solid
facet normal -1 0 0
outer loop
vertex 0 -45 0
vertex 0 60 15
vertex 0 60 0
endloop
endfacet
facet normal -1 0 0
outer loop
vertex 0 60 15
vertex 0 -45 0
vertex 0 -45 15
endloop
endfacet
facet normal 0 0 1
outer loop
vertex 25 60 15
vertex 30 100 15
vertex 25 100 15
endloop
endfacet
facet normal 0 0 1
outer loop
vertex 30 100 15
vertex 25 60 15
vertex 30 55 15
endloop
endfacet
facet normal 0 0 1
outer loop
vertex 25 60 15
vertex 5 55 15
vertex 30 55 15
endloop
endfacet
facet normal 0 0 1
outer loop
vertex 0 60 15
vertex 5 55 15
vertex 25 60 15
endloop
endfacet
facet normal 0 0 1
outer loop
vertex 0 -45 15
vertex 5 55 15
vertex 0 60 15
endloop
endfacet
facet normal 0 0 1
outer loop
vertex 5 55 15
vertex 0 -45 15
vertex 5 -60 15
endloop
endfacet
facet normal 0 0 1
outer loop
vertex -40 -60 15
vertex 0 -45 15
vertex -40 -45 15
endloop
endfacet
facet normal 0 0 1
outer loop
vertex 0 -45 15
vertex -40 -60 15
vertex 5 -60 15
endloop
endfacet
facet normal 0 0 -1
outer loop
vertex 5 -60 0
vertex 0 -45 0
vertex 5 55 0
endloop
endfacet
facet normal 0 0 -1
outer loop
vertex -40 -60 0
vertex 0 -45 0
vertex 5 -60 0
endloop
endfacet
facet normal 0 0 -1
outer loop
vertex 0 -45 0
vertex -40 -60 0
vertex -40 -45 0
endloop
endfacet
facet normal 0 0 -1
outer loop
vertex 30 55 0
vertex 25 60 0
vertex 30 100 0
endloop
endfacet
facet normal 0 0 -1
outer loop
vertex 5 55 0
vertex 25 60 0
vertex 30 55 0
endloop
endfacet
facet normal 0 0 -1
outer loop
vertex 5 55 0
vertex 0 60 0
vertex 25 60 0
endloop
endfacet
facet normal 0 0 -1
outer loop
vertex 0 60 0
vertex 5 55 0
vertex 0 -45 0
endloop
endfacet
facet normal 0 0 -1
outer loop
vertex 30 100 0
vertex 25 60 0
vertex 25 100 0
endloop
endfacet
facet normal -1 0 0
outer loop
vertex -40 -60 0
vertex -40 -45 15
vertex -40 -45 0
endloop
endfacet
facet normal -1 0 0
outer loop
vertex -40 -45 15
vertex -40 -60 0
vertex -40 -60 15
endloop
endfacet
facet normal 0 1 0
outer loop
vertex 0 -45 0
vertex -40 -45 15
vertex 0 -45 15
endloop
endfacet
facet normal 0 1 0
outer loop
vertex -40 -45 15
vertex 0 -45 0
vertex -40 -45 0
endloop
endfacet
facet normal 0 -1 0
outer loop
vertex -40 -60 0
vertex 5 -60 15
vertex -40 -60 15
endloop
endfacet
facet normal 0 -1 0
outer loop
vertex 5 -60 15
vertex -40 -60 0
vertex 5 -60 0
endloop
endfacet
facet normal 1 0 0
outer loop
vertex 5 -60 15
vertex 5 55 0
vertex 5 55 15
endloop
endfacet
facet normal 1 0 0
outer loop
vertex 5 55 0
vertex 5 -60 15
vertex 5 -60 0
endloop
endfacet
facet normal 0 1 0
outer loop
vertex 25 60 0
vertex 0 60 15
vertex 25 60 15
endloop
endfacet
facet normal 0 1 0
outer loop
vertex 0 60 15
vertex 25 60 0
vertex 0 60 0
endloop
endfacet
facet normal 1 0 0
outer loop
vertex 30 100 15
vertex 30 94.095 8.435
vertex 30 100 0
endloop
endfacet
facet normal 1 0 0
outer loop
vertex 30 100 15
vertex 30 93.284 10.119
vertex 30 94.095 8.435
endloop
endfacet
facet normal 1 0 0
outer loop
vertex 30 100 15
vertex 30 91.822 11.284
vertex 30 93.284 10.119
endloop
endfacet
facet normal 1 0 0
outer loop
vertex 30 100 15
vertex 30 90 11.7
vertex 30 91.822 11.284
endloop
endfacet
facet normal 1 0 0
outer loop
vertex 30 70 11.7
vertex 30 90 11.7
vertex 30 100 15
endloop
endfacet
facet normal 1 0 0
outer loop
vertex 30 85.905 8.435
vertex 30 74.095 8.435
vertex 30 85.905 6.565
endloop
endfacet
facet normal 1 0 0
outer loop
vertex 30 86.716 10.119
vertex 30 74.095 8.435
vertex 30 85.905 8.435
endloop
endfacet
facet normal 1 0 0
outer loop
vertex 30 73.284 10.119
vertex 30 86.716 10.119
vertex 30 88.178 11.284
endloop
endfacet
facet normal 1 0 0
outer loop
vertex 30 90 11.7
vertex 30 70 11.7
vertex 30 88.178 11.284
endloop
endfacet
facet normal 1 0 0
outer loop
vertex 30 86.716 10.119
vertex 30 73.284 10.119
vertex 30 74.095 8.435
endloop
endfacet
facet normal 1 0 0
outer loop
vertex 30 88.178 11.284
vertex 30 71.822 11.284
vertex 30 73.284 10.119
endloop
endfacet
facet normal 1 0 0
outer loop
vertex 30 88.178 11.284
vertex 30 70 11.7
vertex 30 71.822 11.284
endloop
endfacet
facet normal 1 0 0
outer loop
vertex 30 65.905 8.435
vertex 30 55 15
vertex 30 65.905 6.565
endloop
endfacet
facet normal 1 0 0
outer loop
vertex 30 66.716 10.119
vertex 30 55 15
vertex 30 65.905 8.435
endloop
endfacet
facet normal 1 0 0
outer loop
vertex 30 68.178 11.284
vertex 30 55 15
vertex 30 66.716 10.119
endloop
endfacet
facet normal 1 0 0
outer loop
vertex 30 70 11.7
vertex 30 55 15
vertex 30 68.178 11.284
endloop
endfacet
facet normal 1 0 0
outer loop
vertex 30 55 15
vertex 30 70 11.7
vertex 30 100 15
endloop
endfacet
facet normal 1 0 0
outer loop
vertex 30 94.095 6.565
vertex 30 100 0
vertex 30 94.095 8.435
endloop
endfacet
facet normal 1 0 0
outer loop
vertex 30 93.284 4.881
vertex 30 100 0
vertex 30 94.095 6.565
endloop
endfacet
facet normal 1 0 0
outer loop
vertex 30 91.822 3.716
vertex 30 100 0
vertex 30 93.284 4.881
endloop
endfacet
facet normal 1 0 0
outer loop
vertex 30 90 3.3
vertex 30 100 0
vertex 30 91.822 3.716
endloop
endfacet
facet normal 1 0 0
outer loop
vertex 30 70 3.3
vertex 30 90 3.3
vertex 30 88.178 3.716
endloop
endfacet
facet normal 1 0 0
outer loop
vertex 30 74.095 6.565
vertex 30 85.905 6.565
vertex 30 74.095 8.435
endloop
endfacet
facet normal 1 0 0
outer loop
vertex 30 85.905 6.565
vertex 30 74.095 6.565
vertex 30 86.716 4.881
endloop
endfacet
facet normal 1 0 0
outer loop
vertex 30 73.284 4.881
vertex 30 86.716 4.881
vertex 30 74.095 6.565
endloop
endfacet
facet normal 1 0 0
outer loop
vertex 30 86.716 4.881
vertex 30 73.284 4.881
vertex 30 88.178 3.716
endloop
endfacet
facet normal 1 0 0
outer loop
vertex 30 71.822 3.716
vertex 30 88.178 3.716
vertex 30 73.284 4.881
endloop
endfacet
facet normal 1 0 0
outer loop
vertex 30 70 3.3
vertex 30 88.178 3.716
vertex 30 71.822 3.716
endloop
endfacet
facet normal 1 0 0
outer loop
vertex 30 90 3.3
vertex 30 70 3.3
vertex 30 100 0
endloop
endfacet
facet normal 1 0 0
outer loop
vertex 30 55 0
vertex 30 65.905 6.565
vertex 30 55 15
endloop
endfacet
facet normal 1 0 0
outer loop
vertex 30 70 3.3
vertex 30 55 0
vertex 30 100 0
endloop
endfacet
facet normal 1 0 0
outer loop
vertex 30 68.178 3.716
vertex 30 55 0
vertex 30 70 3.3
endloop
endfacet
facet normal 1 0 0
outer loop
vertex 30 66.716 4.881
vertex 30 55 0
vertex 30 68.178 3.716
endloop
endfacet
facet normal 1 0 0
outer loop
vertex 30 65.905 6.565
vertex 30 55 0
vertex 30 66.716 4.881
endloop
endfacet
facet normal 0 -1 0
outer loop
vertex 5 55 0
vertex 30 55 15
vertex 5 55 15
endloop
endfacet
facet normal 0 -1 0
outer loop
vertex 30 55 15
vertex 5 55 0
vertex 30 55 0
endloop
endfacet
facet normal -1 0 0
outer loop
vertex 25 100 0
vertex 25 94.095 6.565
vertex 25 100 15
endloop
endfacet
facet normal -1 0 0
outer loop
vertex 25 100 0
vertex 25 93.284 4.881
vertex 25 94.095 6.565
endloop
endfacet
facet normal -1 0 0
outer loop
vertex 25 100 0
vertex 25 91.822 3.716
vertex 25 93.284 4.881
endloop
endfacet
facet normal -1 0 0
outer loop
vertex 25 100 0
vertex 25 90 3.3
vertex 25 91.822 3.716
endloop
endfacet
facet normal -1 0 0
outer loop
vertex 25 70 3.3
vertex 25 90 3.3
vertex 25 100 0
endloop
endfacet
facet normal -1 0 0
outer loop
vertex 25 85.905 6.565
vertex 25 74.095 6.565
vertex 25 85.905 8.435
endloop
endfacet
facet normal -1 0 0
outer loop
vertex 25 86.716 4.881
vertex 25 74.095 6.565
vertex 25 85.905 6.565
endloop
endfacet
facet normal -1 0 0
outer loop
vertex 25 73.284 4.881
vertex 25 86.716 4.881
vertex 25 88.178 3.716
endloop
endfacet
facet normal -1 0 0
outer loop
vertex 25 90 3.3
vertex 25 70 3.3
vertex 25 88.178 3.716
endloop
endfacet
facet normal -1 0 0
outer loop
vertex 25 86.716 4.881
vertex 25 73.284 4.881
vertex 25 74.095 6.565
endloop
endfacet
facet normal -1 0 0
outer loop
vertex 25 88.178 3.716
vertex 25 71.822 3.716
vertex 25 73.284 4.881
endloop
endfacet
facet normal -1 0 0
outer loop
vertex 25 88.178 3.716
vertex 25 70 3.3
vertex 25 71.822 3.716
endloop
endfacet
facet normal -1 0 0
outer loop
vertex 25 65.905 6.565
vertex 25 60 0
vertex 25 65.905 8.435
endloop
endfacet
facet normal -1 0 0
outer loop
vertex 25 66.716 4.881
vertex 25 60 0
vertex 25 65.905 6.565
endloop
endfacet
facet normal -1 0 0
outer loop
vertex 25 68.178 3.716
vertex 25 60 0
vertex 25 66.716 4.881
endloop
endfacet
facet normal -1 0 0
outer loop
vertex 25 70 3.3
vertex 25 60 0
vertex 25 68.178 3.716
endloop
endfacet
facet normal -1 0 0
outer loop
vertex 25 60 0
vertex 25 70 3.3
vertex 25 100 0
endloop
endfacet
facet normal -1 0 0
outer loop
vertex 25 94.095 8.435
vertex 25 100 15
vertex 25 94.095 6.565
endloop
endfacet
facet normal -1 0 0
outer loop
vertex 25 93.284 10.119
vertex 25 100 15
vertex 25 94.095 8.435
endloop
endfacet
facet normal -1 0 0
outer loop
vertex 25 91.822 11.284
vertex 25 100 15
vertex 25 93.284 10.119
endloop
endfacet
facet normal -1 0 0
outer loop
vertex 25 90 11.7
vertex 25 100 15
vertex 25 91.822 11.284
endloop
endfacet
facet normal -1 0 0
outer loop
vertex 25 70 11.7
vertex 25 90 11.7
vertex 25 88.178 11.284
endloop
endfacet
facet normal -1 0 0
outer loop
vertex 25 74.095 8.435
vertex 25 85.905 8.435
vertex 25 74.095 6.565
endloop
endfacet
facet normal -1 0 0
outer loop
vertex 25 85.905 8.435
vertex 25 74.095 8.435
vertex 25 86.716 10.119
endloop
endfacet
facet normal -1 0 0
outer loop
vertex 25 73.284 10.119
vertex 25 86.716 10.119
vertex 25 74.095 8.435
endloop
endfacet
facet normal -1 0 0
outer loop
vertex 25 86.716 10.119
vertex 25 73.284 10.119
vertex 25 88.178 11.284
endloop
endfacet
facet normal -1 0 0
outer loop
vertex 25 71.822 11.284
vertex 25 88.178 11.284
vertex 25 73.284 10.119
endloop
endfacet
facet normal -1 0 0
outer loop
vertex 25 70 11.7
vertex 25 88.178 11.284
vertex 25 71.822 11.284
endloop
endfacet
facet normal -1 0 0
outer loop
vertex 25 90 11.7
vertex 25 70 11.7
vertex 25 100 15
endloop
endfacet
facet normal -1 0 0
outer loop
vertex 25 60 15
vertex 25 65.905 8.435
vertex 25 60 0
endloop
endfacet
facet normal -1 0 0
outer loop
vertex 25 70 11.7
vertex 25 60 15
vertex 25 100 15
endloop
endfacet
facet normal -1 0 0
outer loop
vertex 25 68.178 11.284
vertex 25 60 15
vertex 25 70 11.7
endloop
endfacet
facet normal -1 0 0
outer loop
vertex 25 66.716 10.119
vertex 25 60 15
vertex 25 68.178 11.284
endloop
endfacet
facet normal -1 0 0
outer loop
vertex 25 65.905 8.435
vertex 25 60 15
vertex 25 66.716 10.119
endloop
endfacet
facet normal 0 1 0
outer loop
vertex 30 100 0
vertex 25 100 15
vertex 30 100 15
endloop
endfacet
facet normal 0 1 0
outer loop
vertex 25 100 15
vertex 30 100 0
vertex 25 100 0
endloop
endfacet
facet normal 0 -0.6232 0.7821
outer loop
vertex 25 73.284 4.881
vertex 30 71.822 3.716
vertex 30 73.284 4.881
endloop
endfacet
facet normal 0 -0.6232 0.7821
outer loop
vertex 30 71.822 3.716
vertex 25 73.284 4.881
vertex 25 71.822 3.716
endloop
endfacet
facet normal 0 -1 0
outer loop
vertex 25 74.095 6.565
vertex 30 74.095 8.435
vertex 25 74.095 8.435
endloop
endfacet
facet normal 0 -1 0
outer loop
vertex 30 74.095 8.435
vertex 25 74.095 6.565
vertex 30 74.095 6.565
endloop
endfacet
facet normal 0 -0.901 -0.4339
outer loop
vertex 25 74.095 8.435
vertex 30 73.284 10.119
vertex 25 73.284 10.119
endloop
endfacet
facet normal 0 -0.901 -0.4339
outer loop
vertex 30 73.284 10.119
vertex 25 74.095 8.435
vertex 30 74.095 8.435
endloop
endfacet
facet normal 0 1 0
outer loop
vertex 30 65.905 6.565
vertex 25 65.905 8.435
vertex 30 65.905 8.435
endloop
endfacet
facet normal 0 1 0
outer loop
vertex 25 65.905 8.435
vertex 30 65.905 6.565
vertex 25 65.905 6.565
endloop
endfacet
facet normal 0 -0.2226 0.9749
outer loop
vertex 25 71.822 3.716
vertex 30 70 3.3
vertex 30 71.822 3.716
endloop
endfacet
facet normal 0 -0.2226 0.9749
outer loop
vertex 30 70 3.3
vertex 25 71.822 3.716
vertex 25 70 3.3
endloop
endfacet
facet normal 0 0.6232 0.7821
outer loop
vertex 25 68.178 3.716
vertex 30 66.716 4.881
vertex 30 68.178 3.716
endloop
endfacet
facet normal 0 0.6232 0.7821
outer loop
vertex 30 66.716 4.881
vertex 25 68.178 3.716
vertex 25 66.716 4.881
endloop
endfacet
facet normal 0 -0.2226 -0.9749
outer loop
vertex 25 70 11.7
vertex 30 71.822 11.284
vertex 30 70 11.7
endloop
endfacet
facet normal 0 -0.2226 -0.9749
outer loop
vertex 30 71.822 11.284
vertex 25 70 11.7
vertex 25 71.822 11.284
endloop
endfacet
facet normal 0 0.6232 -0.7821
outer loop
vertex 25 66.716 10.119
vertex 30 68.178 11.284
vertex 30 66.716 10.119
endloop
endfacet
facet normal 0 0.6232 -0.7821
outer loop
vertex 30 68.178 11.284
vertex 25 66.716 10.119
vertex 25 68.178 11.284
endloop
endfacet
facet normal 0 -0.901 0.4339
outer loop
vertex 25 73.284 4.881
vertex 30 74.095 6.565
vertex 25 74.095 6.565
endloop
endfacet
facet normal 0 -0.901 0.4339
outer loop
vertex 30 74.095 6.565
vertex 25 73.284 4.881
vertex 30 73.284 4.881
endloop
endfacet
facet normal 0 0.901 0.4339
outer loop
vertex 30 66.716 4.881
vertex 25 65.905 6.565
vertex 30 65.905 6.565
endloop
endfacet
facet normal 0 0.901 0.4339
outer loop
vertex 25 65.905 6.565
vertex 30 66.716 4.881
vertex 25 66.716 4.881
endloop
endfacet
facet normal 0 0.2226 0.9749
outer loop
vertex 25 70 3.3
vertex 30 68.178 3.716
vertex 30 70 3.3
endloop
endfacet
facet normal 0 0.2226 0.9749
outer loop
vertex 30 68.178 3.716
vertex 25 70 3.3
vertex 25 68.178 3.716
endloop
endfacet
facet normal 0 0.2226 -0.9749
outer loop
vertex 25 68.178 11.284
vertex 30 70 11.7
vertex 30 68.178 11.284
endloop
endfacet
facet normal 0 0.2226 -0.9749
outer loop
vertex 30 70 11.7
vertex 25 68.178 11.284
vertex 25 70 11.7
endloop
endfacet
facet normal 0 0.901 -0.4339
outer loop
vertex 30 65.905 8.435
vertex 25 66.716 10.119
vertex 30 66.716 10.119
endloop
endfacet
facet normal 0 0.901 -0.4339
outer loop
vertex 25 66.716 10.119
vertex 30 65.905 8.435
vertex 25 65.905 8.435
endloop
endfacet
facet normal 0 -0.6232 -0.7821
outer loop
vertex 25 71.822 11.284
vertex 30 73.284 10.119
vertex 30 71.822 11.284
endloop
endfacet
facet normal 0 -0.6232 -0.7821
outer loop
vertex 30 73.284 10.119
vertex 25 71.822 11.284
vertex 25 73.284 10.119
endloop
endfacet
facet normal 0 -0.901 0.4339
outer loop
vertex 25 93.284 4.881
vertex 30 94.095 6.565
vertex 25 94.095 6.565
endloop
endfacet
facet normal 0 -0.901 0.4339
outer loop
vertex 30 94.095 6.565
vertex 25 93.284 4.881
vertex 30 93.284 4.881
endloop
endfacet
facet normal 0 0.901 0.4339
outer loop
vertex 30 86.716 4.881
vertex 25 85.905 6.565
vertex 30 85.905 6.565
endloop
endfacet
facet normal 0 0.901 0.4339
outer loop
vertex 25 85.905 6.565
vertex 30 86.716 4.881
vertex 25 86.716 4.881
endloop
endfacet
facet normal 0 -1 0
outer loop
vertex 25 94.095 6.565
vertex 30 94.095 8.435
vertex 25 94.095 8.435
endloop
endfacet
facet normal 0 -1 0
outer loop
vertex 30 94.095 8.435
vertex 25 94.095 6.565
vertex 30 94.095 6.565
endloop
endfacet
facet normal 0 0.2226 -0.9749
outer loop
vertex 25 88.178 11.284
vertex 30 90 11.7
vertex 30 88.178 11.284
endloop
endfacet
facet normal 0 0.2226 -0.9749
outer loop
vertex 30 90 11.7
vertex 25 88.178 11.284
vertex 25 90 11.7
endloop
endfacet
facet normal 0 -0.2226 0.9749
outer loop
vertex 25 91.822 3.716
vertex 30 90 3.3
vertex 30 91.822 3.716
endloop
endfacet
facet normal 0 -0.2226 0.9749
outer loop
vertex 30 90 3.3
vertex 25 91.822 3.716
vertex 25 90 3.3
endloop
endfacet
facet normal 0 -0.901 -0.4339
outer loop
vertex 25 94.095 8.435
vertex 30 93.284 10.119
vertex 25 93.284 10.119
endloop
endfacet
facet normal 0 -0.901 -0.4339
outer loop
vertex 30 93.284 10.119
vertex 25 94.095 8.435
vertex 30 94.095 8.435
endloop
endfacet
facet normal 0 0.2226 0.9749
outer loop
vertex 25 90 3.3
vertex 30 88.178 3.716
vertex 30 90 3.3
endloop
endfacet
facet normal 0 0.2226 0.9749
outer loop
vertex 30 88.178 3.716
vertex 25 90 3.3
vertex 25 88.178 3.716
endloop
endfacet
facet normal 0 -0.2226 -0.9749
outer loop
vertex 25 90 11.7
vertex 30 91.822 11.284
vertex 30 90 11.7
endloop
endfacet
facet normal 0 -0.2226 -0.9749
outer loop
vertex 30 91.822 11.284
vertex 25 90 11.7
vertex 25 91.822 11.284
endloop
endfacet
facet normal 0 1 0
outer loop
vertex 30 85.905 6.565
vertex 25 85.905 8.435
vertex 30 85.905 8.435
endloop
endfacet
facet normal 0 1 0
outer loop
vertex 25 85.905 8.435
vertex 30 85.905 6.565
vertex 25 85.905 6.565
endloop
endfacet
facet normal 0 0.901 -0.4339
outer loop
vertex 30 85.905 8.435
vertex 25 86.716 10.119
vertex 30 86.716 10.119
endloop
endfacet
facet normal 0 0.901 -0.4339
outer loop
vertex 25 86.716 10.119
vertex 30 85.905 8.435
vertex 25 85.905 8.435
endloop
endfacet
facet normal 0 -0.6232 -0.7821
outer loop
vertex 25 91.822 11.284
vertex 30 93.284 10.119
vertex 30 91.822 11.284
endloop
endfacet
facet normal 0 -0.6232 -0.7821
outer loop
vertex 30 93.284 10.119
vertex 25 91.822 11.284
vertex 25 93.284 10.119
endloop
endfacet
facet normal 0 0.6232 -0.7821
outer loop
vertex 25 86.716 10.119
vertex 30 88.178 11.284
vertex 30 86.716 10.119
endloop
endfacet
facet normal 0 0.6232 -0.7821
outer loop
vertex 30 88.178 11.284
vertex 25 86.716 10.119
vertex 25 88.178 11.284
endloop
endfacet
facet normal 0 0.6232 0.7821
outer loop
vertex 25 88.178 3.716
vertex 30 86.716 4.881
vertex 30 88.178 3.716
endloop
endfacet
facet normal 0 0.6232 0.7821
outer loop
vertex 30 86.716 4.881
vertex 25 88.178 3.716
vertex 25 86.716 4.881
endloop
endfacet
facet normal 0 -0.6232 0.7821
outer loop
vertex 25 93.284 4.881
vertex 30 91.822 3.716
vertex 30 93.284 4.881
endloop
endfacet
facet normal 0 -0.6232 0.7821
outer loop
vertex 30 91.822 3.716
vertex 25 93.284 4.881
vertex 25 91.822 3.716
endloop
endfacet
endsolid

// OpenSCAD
// file: ../../config.scad
r4 = 2.2;
r8 = 4.2;
r10 = 5.2;

layer_height = 0.25;

switch_d = 9.6;

nema17_r_vis = 15.5;
nema17_r_centre = 11.5;
nema17_h_centre = 2;
nema17_h = 43;
nema17_l = 40;

boite_ui_largeur = 28.5;
boite_ui_l = 46;

support_laser = 24;

r3 = 1.75;
r3_2d = 1.5;
r3_vis = 1.65;
r3_head = 3.6;
m3_r = r3;
m3_nut_d = 7;
m3_nut_d2 = 6.2;
m3_nut_h = 3;

m4_nut_d = 8;
m4_nut_d2 = 7;
m4_nut_h = 4;

608_r = 23/2;
608_h = 8;

laser_printer_l = 609;
laser_printer_lg = 456;

module support_nut(d=3, l_screw1 = 20, l_screw2 = 20, l_nut = 20, h_screw2 = -0.1){
    if(d==3){
        screw_r = r3;
        nut_r = m3_nut_d/2;
        nut_h = m3_nut_h;
        cylinder(nut_h, r = nut_r, $fn = 6, center = true);
        translate([0, 0, -l_screw1])cylinder(l_screw1 +1, r = screw_r);
        translate([0, 0, m3_nut_h/2+ h_screw2])cylinder(l_screw2, r = screw_r);
        l = m3_nut_d*cos(30);
        translate([0, -l/2, -nut_h/2]) cube([l_nut, l,nut_h]);
    } else if(d==4){
        screw_r = r4;
        nut_r = m4_nut_d/2;
        nut_h = m4_nut_h;
        cylinder(nut_h, r = nut_r, $fn = 6, center = true);
        translate([0, 0, -l_screw1])cylinder(l_screw1 +1, r = screw_r);
        translate([0, 0, m4_nut_h/2+ h_screw2])cylinder(l_screw2, r = screw_r);
        l = m4_nut_d*cos(30);
        translate([0, -l/2, -nut_h/2]) cube([l_nut, l,nut_h]);
    }
}


module nut(d=3, center = false){
    nut_r = m3_nut_d/2;
    nut_h = m3_nut_h;
    if(d==3){
        nut_r = m3_nut_d/2;
        nut_h = m3_nut_h;
    } 
    cylinder(nut_h, r = nut_r, $fn = 6, center = center);
}



module m3(h, nut = false, head = false){
    cylinder(h, m3_r, m3_r, $fn=16);
    if(nut){
        cylinder(m3_nut_h, r = m3_nut_d/2, $fn = 6);
    }
}

module m3_nut(h){
    cylinder(m3_nut_h, r = m3_nut_d/2, $fn = 6);
    translate([0, -m3_nut_d2/2, 0]) cube([h, m3_nut_d2, m3_nut_h]);
}

m4_r = 2.3;
m4_nut_d = 8.4;
m4_nut_d2 = 7.5;
m4_nut_h = 3.5;
module m4(h, nut = false, head = false){
    cylinder(h, m4_r, m4_r);
    if(nut){
        cylinder(m4_nut_h, r = m4_nut_d/2, $fn = 6);
    }
}

module m5(h, nut = false, head = false){
    cylinder(h, r = 2.7);
}

m8_nut_d = 15;
m8_nut_d2 = 13;
m8_nut_h = 6.5;
module m8(h, nut = false, head = false){
    cylinder(h, r = r8);
    if(nut){
        cylinder(m8_nut_h, r = m8_nut_d/2, $fn = 6);
    }
}

module cube_arrondi(x, y, z, r=2){
    hull(){
        translate([(x/2-r), (y/2-r), 0]) cylinder(z,r=r);
        translate([(x/2-r), -(y/2-r), 0]) cylinder(z,r=r);
        translate([-(x/2-r), (y/2-r), 0]) cylinder(z,r=r);
        translate([-(x/2-r), -(y/2-r), 0]) cylinder(z,r=r);
    }
}

module demi_glissiere(r, l, h){
    cylinder(h, r, r);
    translate([-r, 0, 0]) cube([r*2, l, h]);
}


module nema17_2d(){
    nema17_l = 43;
    nema17_h = 6;
    polygon([[0,nema17_h], [nema17_h,0]
            , [nema17_l-nema17_h,0],[nema17_l,nema17_h]
            , [nema17_l,nema17_l-nema17_h],[nema17_l-nema17_h,nema17_l]
            , [8,nema17_l],[0,nema17_l-nema17_h] ]);
}

module nema17_2d2(){
    translate([nema17_r_vis, nema17_r_vis] ) circle(r3_2d);
    translate([nema17_r_vis, -nema17_r_vis] ) circle(r3_2d);
    translate([-nema17_r_vis, nema17_r_vis] ) circle(r3_2d);
    translate([-nema17_r_vis, -nema17_r_vis] ) circle(r3_2d);
    circle(nema17_r_centre);
}


module nema17(){
    translate([-nema17_h/2, -nema17_h/2, -nema17_l/2] ) linear_extrude(nema17_l) nema17_2d();
    
    h = nema17_h/2+6;
    translate([nema17_r_vis, nema17_r_vis, 0] )rotate([0, 0, 0]) cylinder(h, r = r3);
    translate([nema17_r_vis, -nema17_r_vis, 0] )rotate([0, 0, 0]) cylinder(h, r = r3);
    translate([-nema17_r_vis, nema17_r_vis, 0] )rotate([0, 0, 0]) cylinder(h, r = r3);
    translate([-nema17_r_vis, -nema17_r_vis, 0] )rotate([0, 0, 0]) cylinder(h, r = r3);
    cylinder(h, nema17_r_centre, nema17_r_centre);
    cylinder(h+14, r = 8);
    
    translate([-8.5, 0, -nema17_l/2] ) cube([17,30, 10]);
}

module corner(l_corner, h_corner, lg_corner){
    translate([0, lg_corner, 0]) rotate([90, 0, 0]) linear_extrude(lg_corner) polygon([[0,0], [l_corner, 0], [0, h_corner]]);
}


/**
 * 2D
 **/

module m3_2d(){
    circle(r3_2d);
}


module cran_x(_l, e, cran, inv){
    difference(){
        square([_l, e]);
        if(inv){
            for(i=[-round(_l/cran):round(_l/cran)]){
                translate([_l/2 + cran/2 - 2*i*cran, -1]) square([cran, e+2]);
            }
        }else{
            for(i=[-round(_l/cran):round(_l/cran)]){
                translate([_l/2 - cran/2 - 2*i*cran, -1]) square([cran, e+2]);
            }
        }
    }
}

module cran_y(_l, e, cran, inv){
    translate([e, 0]) rotate([0, 0, 90]) cran_x(_l, e, cran, inv); 
}

module whole_2d(type_vis){
    if(type_vis == 3){
        circle(1.5);
    } else if(type_vis == 4){
        circle(2);
    } else {
        echo("whole_2d " + type_vis);
    }
}

module nuts_2d(type_vis){
    if(type_vis == 3){
        translate([-1.5, 0])square([3, 20]);
        translate([-5.5/2, 10])square([5.5, 2.5]);
    } else if(type_vis == 4){
        translate([-2, 0])square([4, 30]);
        translate([-7/2, 20])square([7, 3.5]);
    } else {
        echo("nuts_2d " + type_vis);
    }
}

module cran_x_vis(_l, e, cran, type_vis = 3, trous = [0.1, 0.5, 0.9]){
    difference(){
        square([_l, e]);
        for(i=[-round(_l/cran):round(_l/cran)]){
                translate([_l/2 - cran/2 - 2*i*cran, -1]) square([cran, e+2]);
            }
        
    }
    for(i = trous){
        j = round((i-0.5)*_l/(2*cran));
        translate([_l/2  - 2*j*cran, e/2]) whole_2d(type_vis);
    }
}

module cran_x_nuts(_l, e, cran, type_vis = 3, trous = [0.1, 0.5, 0.9]){
    difference(){
        square([_l, e]);
        for(i=[-round(_l/cran):round(_l/cran)]){
                translate([_l/2 + cran/2 - 2*i*cran, -1]) square([cran, e+2]);
        }
    }
    for(i = trous){
        j = round((i-0.5)*_l/(2*cran));
        translate([_l/2  - 2*j*cran, e/2]) nuts_2d(type_vis);
    }
}

module cran_y_vis(_l, e, cran, type_vis = 3, trous = [0.1, 0.5, 0.9]){
    translate([e, 0]) rotate([0, 0, 90]) cran_x_vis(_l, e, cran, type_vis, trous);
}

module cran_y_nuts(_l, e, cran, type_vis = 3, trous = [0.1, 0.5, 0.9]){
    translate([0, _l]) rotate([0, 0, -90]) cran_x_nuts(_l, e, cran, type_vis, trous);
}


module fixation_2d(){
    translate([-5,0])square([2,4], center=true);
    translate([5,0])square([2,4], center=true);
}
// main file
include <../../config.scad>

//20

difference(){
    union(){
        translate([-40,-60,0]) cube([40,15, 15]);
        translate([0,-60,0]) cube([5,120, 15]);
        translate([0,55,0]) cube([30, 5, 15]);
        translate([25,55,0]) cube([5, 45, 15]);
        
        
    }
    translate([20,55 + 15,7.5]) rotate([0, 90, 0]) m8(30);
        translate([20,55 + 35,7.5]) rotate([0, 90, 0]) m8(30);
}
